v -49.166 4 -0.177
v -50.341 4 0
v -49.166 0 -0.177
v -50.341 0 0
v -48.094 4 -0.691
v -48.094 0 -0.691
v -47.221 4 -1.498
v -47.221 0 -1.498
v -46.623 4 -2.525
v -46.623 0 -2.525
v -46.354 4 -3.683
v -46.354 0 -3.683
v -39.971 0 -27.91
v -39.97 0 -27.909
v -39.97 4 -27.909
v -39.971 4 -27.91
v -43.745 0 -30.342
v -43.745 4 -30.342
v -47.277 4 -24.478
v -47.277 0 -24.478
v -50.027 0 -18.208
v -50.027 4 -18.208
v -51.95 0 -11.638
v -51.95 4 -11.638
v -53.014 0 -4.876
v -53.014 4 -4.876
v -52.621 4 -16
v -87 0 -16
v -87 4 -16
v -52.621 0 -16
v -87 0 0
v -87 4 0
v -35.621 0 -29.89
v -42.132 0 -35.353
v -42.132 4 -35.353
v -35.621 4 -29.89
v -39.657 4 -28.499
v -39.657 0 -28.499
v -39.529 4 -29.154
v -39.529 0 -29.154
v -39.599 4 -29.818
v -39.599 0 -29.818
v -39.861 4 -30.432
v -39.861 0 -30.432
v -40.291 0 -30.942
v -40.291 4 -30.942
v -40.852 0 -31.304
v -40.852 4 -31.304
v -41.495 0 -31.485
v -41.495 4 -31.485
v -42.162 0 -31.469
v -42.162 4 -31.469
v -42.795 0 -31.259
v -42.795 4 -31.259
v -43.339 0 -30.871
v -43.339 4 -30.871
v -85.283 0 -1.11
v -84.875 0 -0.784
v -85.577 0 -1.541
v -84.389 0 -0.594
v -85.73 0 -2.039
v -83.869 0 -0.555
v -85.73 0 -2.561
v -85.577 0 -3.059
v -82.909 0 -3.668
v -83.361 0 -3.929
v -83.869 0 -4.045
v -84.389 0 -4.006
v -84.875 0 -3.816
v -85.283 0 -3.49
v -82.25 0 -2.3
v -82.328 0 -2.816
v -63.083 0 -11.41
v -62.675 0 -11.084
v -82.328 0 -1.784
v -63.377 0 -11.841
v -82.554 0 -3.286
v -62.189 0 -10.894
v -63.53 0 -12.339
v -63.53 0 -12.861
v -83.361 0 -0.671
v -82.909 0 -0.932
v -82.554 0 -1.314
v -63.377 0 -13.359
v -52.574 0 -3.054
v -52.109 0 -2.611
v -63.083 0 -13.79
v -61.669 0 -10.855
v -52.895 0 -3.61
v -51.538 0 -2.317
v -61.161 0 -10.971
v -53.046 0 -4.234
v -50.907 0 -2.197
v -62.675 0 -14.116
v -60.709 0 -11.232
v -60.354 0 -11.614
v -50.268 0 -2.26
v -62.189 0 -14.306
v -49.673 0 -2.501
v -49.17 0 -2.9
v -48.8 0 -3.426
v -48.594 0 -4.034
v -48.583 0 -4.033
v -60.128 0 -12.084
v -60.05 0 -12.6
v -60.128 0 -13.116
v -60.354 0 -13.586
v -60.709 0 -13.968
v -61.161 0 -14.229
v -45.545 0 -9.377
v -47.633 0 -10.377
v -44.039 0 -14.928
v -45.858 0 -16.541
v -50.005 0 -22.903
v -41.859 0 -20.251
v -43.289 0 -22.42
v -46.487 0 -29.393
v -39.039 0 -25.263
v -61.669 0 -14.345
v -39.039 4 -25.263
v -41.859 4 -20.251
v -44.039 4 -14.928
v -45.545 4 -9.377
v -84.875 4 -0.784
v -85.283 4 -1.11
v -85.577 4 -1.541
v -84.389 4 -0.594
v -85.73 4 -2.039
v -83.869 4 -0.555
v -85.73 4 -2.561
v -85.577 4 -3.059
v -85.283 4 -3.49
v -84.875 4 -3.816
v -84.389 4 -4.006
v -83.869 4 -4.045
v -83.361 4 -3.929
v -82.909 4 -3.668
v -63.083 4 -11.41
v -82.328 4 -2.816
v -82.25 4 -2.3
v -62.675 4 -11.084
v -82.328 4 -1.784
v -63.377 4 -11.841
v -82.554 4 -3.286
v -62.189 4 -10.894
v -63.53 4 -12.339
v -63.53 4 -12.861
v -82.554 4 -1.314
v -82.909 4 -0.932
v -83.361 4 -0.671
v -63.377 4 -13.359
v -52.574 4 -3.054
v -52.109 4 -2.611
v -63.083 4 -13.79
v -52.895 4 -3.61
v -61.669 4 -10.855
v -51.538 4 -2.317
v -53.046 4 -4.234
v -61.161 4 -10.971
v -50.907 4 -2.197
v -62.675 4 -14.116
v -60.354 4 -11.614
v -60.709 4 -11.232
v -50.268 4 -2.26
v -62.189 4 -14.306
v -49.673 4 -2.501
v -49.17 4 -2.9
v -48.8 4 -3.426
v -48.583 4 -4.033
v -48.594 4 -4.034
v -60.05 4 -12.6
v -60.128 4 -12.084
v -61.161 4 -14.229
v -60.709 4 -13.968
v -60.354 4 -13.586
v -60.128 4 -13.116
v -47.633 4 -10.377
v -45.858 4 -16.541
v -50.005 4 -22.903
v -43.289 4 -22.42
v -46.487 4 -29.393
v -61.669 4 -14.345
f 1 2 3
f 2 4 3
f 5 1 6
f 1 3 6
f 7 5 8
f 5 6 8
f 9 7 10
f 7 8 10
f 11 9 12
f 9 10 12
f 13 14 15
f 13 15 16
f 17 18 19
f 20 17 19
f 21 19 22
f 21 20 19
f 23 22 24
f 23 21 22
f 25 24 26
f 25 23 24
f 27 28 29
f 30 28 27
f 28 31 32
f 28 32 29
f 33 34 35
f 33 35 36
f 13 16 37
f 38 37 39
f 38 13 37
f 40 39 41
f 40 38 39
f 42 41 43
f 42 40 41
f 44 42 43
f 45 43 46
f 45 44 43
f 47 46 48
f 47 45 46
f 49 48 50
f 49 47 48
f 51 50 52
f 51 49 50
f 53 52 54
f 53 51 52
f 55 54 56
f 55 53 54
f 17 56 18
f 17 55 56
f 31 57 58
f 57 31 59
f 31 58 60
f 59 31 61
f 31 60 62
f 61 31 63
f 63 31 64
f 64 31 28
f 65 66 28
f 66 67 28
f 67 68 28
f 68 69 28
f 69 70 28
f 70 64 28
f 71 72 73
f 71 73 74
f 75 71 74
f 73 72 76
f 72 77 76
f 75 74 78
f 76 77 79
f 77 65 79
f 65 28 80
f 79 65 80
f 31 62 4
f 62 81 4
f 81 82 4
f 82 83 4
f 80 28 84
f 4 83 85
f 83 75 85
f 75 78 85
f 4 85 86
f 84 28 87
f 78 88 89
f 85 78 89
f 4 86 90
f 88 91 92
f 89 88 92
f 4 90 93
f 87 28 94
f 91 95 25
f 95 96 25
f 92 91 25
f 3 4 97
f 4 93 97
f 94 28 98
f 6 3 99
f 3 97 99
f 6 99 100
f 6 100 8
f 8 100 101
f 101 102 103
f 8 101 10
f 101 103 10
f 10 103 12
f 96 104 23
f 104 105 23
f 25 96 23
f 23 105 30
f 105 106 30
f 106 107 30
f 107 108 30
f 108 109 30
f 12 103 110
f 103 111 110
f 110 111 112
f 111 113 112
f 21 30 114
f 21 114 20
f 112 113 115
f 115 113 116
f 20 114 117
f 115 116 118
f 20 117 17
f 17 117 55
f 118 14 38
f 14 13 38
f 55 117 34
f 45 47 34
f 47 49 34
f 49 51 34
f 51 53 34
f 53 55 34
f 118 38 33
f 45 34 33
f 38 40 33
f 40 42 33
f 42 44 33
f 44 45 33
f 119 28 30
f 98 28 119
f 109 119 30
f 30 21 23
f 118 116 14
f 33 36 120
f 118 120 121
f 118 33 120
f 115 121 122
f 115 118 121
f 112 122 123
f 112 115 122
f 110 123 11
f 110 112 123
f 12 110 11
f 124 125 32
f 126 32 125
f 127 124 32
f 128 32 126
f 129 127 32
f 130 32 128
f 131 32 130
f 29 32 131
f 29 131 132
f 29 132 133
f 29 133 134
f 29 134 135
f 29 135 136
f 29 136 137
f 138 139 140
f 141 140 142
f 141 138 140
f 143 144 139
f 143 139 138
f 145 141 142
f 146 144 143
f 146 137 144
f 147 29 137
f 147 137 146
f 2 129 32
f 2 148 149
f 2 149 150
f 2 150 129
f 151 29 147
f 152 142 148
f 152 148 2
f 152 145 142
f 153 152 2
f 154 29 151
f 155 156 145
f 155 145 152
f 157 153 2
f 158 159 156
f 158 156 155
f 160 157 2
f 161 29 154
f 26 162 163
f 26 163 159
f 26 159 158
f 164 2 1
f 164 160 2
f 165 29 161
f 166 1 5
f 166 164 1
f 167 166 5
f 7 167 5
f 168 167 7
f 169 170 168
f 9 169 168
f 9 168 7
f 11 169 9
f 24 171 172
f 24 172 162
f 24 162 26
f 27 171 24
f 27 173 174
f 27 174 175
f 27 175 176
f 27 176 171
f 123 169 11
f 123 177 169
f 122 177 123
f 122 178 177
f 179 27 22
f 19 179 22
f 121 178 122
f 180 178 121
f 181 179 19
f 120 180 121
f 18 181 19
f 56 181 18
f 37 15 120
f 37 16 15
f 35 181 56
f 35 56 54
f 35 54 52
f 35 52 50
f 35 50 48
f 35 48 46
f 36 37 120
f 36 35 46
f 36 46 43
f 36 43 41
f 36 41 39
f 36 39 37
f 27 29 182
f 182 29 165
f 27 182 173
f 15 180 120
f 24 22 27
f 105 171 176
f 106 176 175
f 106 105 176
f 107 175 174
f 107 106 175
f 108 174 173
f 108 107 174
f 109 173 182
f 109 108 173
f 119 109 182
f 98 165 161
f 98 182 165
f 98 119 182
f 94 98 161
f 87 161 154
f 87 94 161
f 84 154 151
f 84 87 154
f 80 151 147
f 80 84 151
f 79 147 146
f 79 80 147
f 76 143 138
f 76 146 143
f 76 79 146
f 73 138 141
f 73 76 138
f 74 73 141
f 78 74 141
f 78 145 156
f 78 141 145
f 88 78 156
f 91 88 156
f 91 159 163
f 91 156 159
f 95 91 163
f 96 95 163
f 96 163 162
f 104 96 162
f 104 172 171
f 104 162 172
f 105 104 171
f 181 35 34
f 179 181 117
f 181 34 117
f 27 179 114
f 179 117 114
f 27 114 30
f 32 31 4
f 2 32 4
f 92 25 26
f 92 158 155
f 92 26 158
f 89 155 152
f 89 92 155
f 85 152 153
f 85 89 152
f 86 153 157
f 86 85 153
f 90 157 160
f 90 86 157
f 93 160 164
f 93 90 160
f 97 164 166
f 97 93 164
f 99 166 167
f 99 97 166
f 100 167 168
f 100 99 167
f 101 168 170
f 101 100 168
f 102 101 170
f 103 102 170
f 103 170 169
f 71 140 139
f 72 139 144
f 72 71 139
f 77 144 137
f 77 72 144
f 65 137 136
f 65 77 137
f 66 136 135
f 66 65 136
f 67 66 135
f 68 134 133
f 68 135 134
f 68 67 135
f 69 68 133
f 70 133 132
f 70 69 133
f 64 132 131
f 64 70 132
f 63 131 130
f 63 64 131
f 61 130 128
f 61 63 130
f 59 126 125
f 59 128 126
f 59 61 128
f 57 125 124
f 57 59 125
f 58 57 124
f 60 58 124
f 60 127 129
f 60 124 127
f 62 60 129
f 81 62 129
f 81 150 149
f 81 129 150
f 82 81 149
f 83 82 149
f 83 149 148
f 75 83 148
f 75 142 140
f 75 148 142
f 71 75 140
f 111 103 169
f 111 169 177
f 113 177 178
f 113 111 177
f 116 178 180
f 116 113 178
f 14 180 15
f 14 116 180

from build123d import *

# Parameters (mm, degrees)
SKETCH1_R           = 55
BOSS_EXTRUDE1_DEPTH = 4
SKETCH6_W           = 87
SKETCH6_H           = 16
BOSS_EXTRUDE2_DEPTH = 4
SKETCH2_R           = 46.5
CUT_EXTRUDE1_DEPTH  = 5
SKETCH3_R           = 2.25
CUT_EXTRUDE2_DEPTH  = 5
CIRPATTERN1_COUNT   = 12
CUT_EXTRUDE3_DEPTH  = 5
SKETCH7_R           = 1.75
CUT_EXTRUDE4_DEPTH  = 5
FILLET1_R           = 4
CUT_EXTRUDE5_DEPTH  = 5


with BuildPart() as part:
    # Sketch1 → Boss-Extrude1 (new body)
    with BuildSketch(Plane(origin=(0, 0, 0), x_dir=(1, 0, 0), z_dir=(0, 1, 0))):
        Circle(SKETCH1_R)
    extrude(amount=BOSS_EXTRUDE1_DEPTH)

    # Sketch6 → Boss-Extrude2 (add)
    with BuildSketch(Plane(origin=(0, 0, 0), x_dir=(1, 0, 0), z_dir=(0, 1, 0))):
        with Locations((-43.5, 8)):
            Rectangle(SKETCH6_W, SKETCH6_H)
    extrude(amount=BOSS_EXTRUDE2_DEPTH)

    # Sketch2 → Cut-Extrude1 (cut, through all)
    with BuildSketch(Plane(origin=(0, 0, 0), x_dir=(1, 0, 0), z_dir=(0, 1, 0))):
        Circle(SKETCH2_R)
    extrude(amount=CUT_EXTRUDE1_DEPTH, mode=Mode.SUBTRACT)

    # Sketch3 → Cut-Extrude2 (cut, through all)
    with BuildSketch(Plane(origin=(0, 0, 0), x_dir=(1, 0, 0), z_dir=(0, 1, 0))):
        with Locations((-50.805929603, 4.44494288)):
            Circle(SKETCH3_R)
    cut_extrude2 = extrude(amount=CUT_EXTRUDE2_DEPTH, mode=Mode.SUBTRACT)

    # CirPattern1: Cut-Extrude2 ×12 about axis
    cirpattern1_axis = Axis((0, 0, 0), (0, 1, 0))
    for i in range(1, CIRPATTERN1_COUNT):
        add(cut_extrude2.rotate(cirpattern1_axis, i * 360 / CIRPATTERN1_COUNT), mode=Mode.SUBTRACT)

    # Sketch4 → Cut-Extrude3 (cut, through all)
    with BuildSketch(Plane(origin=(0, 0, 0), x_dir=(1, 0, 0), z_dir=(0, 1, 0))):
        with BuildLine():
            Line((0, 0), (-62.402274146, 0))
            ThreePointArc((-62.402274146, 0), (58.638956535, -21.342834747), (-47.802915347, 40.111408637))
            Line((-47.802915347, 40.111408637), (0, 0))
        make_face()
    extrude(amount=CUT_EXTRUDE3_DEPTH, mode=Mode.SUBTRACT)

    # Sketch7 → Cut-Extrude4 (cut, through all)
    with BuildSketch(Plane(origin=(0, 0, 0), x_dir=(1, 0, 0), z_dir=(0, 1, 0))):
        with Locations((-61.8, 12.6)):
            Circle(SKETCH7_R)
        with Locations((-84, 2.3)):
            Circle(SKETCH7_R)
    extrude(amount=CUT_EXTRUDE4_DEPTH, mode=Mode.SUBTRACT)

    # Fillet1
    fillet1_edges = [part.edges().sort_by_distance(p)[0] for p in [
        (-46.5, 2, 0),
    ]]
    fillet(fillet1_edges, radius=FILLET1_R)

    # Sketch8 → Cut-Extrude5 (cut, through all)
    with BuildSketch(Plane(origin=(0, 0, 0), x_dir=(1, 0, 0), z_dir=(0, 1, 0))):
        with BuildLine():
            Line((-39.970362944, 27.909363771), (-43.650121746, 30.47876068))
            ThreePointArc((-43.650121746, 30.47876068), (-50.07963309, 18.064283285), (-53.055558124, 4.404058716))
            Line((-53.055558124, 4.404058716), (-48.582909499, 4.032791164))
            ThreePointArc((-48.582909499, 4.032791164), (-45.857858596, 16.541442048), (-39.970362944, 27.909363771))
        make_face()
    extrude(amount=CUT_EXTRUDE5_DEPTH, mode=Mode.SUBTRACT)


solid = part.part
